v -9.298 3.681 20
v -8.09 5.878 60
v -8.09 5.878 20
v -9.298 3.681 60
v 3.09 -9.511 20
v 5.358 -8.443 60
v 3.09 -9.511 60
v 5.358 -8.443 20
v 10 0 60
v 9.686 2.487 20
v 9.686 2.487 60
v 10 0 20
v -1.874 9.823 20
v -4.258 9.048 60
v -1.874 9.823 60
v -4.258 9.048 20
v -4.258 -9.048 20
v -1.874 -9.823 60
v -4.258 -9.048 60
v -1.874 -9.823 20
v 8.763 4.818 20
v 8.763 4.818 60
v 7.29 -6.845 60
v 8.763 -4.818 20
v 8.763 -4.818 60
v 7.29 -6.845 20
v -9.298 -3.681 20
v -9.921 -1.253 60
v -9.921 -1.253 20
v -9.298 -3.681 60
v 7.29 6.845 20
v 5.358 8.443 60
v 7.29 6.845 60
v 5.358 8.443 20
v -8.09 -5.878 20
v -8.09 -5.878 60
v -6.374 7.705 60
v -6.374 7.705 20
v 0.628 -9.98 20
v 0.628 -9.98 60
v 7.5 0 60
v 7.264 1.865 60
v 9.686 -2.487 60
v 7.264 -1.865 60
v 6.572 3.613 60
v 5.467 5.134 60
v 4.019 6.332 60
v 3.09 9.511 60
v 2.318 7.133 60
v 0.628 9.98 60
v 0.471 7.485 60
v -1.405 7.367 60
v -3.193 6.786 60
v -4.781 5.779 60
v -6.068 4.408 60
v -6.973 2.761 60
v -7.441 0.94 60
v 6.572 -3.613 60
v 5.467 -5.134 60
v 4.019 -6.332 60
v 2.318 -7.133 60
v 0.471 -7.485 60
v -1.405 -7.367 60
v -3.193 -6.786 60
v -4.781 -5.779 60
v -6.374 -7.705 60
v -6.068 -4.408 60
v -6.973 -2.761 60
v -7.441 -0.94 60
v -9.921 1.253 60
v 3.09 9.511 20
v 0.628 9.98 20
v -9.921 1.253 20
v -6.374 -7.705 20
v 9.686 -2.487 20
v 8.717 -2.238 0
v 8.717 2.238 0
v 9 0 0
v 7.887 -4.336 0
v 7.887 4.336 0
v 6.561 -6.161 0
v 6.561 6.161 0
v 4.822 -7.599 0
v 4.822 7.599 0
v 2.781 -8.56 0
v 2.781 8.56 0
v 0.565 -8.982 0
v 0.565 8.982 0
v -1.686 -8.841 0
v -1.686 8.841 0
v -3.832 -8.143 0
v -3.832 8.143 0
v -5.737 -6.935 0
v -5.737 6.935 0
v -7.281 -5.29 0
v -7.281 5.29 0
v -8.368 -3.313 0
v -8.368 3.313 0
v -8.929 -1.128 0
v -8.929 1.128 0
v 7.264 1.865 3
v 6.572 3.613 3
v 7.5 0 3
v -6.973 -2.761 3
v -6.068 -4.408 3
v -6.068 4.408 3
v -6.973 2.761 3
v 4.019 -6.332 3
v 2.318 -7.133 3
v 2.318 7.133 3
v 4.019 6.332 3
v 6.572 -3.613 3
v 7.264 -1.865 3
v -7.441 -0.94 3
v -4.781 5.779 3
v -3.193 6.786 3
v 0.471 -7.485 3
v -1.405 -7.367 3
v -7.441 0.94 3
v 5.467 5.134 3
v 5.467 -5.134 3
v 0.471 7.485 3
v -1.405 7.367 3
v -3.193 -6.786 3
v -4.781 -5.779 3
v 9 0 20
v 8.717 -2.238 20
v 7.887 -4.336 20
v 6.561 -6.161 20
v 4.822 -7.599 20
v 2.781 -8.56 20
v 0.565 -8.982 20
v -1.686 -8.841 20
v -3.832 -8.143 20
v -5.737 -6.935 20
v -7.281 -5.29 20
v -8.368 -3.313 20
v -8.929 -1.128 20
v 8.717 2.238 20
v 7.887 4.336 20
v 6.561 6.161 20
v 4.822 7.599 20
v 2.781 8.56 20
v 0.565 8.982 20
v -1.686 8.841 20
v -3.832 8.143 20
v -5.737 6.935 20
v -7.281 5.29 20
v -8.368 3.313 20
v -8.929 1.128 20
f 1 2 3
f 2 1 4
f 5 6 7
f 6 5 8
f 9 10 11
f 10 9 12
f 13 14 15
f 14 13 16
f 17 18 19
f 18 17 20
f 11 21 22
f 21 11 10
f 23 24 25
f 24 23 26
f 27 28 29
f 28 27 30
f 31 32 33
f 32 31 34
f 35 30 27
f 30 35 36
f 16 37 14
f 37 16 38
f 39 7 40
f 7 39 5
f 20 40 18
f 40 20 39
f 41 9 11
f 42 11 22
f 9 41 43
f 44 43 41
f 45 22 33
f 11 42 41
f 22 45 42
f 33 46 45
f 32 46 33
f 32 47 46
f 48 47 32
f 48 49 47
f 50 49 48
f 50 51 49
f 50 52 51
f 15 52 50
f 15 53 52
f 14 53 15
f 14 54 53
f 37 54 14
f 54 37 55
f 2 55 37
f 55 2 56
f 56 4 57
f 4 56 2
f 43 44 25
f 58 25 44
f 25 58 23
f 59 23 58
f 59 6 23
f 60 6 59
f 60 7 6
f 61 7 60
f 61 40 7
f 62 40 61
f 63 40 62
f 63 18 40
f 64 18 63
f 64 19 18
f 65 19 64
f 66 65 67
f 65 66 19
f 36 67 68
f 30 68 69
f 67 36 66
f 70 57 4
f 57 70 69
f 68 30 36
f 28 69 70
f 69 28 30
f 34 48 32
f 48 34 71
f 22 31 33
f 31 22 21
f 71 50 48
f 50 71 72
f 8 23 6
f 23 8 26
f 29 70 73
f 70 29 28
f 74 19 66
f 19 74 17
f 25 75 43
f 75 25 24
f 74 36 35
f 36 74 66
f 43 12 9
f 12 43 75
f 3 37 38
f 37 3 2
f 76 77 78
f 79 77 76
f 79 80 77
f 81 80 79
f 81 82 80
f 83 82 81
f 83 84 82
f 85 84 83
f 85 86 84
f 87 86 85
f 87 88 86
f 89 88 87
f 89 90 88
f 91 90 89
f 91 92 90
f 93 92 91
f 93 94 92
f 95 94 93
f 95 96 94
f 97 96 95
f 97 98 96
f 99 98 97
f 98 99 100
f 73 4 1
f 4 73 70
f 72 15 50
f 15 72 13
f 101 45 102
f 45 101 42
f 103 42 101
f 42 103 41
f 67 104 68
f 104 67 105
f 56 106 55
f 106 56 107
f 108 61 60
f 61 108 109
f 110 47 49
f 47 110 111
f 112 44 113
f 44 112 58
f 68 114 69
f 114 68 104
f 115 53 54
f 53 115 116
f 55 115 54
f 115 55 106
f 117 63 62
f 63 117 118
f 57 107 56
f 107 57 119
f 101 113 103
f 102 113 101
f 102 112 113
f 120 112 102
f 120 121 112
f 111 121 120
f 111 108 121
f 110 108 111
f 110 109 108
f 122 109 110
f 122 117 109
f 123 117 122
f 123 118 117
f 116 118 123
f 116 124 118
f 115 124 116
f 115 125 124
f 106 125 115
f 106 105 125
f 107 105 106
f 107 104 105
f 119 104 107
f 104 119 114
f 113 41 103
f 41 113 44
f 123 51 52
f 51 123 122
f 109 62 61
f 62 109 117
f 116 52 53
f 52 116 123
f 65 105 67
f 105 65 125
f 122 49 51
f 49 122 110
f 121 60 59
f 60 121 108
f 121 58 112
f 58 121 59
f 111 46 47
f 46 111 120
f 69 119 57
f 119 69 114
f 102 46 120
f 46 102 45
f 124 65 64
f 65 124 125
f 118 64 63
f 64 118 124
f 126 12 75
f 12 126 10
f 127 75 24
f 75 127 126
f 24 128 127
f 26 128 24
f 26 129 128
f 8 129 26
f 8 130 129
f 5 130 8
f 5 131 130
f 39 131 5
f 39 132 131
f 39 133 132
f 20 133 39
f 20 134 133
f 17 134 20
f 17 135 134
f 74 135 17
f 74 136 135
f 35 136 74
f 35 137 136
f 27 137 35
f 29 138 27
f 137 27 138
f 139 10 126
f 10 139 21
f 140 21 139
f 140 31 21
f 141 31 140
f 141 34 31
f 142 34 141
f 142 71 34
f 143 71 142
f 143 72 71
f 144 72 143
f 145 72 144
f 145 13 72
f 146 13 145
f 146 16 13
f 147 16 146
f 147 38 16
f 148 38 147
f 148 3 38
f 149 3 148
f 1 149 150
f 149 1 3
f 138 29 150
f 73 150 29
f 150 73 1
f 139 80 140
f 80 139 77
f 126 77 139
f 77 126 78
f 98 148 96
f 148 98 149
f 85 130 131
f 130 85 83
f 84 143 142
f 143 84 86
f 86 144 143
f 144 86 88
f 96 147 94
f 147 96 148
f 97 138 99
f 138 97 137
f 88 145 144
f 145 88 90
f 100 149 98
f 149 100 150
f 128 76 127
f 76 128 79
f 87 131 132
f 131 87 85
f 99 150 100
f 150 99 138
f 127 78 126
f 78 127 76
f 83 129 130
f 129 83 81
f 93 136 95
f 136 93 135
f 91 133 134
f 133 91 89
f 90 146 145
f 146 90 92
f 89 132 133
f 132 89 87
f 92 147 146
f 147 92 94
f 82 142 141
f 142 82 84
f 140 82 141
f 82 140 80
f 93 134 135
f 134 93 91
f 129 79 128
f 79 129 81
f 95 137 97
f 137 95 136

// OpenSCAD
$fn = 25;

difference (){
difference () {
cylinder(60, d=20,center=false);
translate([0,0,3]){cylinder(60, d=15);}
}

difference () {
    cylinder(20, d=22);
    cylinder(20, d=18);
}
}
